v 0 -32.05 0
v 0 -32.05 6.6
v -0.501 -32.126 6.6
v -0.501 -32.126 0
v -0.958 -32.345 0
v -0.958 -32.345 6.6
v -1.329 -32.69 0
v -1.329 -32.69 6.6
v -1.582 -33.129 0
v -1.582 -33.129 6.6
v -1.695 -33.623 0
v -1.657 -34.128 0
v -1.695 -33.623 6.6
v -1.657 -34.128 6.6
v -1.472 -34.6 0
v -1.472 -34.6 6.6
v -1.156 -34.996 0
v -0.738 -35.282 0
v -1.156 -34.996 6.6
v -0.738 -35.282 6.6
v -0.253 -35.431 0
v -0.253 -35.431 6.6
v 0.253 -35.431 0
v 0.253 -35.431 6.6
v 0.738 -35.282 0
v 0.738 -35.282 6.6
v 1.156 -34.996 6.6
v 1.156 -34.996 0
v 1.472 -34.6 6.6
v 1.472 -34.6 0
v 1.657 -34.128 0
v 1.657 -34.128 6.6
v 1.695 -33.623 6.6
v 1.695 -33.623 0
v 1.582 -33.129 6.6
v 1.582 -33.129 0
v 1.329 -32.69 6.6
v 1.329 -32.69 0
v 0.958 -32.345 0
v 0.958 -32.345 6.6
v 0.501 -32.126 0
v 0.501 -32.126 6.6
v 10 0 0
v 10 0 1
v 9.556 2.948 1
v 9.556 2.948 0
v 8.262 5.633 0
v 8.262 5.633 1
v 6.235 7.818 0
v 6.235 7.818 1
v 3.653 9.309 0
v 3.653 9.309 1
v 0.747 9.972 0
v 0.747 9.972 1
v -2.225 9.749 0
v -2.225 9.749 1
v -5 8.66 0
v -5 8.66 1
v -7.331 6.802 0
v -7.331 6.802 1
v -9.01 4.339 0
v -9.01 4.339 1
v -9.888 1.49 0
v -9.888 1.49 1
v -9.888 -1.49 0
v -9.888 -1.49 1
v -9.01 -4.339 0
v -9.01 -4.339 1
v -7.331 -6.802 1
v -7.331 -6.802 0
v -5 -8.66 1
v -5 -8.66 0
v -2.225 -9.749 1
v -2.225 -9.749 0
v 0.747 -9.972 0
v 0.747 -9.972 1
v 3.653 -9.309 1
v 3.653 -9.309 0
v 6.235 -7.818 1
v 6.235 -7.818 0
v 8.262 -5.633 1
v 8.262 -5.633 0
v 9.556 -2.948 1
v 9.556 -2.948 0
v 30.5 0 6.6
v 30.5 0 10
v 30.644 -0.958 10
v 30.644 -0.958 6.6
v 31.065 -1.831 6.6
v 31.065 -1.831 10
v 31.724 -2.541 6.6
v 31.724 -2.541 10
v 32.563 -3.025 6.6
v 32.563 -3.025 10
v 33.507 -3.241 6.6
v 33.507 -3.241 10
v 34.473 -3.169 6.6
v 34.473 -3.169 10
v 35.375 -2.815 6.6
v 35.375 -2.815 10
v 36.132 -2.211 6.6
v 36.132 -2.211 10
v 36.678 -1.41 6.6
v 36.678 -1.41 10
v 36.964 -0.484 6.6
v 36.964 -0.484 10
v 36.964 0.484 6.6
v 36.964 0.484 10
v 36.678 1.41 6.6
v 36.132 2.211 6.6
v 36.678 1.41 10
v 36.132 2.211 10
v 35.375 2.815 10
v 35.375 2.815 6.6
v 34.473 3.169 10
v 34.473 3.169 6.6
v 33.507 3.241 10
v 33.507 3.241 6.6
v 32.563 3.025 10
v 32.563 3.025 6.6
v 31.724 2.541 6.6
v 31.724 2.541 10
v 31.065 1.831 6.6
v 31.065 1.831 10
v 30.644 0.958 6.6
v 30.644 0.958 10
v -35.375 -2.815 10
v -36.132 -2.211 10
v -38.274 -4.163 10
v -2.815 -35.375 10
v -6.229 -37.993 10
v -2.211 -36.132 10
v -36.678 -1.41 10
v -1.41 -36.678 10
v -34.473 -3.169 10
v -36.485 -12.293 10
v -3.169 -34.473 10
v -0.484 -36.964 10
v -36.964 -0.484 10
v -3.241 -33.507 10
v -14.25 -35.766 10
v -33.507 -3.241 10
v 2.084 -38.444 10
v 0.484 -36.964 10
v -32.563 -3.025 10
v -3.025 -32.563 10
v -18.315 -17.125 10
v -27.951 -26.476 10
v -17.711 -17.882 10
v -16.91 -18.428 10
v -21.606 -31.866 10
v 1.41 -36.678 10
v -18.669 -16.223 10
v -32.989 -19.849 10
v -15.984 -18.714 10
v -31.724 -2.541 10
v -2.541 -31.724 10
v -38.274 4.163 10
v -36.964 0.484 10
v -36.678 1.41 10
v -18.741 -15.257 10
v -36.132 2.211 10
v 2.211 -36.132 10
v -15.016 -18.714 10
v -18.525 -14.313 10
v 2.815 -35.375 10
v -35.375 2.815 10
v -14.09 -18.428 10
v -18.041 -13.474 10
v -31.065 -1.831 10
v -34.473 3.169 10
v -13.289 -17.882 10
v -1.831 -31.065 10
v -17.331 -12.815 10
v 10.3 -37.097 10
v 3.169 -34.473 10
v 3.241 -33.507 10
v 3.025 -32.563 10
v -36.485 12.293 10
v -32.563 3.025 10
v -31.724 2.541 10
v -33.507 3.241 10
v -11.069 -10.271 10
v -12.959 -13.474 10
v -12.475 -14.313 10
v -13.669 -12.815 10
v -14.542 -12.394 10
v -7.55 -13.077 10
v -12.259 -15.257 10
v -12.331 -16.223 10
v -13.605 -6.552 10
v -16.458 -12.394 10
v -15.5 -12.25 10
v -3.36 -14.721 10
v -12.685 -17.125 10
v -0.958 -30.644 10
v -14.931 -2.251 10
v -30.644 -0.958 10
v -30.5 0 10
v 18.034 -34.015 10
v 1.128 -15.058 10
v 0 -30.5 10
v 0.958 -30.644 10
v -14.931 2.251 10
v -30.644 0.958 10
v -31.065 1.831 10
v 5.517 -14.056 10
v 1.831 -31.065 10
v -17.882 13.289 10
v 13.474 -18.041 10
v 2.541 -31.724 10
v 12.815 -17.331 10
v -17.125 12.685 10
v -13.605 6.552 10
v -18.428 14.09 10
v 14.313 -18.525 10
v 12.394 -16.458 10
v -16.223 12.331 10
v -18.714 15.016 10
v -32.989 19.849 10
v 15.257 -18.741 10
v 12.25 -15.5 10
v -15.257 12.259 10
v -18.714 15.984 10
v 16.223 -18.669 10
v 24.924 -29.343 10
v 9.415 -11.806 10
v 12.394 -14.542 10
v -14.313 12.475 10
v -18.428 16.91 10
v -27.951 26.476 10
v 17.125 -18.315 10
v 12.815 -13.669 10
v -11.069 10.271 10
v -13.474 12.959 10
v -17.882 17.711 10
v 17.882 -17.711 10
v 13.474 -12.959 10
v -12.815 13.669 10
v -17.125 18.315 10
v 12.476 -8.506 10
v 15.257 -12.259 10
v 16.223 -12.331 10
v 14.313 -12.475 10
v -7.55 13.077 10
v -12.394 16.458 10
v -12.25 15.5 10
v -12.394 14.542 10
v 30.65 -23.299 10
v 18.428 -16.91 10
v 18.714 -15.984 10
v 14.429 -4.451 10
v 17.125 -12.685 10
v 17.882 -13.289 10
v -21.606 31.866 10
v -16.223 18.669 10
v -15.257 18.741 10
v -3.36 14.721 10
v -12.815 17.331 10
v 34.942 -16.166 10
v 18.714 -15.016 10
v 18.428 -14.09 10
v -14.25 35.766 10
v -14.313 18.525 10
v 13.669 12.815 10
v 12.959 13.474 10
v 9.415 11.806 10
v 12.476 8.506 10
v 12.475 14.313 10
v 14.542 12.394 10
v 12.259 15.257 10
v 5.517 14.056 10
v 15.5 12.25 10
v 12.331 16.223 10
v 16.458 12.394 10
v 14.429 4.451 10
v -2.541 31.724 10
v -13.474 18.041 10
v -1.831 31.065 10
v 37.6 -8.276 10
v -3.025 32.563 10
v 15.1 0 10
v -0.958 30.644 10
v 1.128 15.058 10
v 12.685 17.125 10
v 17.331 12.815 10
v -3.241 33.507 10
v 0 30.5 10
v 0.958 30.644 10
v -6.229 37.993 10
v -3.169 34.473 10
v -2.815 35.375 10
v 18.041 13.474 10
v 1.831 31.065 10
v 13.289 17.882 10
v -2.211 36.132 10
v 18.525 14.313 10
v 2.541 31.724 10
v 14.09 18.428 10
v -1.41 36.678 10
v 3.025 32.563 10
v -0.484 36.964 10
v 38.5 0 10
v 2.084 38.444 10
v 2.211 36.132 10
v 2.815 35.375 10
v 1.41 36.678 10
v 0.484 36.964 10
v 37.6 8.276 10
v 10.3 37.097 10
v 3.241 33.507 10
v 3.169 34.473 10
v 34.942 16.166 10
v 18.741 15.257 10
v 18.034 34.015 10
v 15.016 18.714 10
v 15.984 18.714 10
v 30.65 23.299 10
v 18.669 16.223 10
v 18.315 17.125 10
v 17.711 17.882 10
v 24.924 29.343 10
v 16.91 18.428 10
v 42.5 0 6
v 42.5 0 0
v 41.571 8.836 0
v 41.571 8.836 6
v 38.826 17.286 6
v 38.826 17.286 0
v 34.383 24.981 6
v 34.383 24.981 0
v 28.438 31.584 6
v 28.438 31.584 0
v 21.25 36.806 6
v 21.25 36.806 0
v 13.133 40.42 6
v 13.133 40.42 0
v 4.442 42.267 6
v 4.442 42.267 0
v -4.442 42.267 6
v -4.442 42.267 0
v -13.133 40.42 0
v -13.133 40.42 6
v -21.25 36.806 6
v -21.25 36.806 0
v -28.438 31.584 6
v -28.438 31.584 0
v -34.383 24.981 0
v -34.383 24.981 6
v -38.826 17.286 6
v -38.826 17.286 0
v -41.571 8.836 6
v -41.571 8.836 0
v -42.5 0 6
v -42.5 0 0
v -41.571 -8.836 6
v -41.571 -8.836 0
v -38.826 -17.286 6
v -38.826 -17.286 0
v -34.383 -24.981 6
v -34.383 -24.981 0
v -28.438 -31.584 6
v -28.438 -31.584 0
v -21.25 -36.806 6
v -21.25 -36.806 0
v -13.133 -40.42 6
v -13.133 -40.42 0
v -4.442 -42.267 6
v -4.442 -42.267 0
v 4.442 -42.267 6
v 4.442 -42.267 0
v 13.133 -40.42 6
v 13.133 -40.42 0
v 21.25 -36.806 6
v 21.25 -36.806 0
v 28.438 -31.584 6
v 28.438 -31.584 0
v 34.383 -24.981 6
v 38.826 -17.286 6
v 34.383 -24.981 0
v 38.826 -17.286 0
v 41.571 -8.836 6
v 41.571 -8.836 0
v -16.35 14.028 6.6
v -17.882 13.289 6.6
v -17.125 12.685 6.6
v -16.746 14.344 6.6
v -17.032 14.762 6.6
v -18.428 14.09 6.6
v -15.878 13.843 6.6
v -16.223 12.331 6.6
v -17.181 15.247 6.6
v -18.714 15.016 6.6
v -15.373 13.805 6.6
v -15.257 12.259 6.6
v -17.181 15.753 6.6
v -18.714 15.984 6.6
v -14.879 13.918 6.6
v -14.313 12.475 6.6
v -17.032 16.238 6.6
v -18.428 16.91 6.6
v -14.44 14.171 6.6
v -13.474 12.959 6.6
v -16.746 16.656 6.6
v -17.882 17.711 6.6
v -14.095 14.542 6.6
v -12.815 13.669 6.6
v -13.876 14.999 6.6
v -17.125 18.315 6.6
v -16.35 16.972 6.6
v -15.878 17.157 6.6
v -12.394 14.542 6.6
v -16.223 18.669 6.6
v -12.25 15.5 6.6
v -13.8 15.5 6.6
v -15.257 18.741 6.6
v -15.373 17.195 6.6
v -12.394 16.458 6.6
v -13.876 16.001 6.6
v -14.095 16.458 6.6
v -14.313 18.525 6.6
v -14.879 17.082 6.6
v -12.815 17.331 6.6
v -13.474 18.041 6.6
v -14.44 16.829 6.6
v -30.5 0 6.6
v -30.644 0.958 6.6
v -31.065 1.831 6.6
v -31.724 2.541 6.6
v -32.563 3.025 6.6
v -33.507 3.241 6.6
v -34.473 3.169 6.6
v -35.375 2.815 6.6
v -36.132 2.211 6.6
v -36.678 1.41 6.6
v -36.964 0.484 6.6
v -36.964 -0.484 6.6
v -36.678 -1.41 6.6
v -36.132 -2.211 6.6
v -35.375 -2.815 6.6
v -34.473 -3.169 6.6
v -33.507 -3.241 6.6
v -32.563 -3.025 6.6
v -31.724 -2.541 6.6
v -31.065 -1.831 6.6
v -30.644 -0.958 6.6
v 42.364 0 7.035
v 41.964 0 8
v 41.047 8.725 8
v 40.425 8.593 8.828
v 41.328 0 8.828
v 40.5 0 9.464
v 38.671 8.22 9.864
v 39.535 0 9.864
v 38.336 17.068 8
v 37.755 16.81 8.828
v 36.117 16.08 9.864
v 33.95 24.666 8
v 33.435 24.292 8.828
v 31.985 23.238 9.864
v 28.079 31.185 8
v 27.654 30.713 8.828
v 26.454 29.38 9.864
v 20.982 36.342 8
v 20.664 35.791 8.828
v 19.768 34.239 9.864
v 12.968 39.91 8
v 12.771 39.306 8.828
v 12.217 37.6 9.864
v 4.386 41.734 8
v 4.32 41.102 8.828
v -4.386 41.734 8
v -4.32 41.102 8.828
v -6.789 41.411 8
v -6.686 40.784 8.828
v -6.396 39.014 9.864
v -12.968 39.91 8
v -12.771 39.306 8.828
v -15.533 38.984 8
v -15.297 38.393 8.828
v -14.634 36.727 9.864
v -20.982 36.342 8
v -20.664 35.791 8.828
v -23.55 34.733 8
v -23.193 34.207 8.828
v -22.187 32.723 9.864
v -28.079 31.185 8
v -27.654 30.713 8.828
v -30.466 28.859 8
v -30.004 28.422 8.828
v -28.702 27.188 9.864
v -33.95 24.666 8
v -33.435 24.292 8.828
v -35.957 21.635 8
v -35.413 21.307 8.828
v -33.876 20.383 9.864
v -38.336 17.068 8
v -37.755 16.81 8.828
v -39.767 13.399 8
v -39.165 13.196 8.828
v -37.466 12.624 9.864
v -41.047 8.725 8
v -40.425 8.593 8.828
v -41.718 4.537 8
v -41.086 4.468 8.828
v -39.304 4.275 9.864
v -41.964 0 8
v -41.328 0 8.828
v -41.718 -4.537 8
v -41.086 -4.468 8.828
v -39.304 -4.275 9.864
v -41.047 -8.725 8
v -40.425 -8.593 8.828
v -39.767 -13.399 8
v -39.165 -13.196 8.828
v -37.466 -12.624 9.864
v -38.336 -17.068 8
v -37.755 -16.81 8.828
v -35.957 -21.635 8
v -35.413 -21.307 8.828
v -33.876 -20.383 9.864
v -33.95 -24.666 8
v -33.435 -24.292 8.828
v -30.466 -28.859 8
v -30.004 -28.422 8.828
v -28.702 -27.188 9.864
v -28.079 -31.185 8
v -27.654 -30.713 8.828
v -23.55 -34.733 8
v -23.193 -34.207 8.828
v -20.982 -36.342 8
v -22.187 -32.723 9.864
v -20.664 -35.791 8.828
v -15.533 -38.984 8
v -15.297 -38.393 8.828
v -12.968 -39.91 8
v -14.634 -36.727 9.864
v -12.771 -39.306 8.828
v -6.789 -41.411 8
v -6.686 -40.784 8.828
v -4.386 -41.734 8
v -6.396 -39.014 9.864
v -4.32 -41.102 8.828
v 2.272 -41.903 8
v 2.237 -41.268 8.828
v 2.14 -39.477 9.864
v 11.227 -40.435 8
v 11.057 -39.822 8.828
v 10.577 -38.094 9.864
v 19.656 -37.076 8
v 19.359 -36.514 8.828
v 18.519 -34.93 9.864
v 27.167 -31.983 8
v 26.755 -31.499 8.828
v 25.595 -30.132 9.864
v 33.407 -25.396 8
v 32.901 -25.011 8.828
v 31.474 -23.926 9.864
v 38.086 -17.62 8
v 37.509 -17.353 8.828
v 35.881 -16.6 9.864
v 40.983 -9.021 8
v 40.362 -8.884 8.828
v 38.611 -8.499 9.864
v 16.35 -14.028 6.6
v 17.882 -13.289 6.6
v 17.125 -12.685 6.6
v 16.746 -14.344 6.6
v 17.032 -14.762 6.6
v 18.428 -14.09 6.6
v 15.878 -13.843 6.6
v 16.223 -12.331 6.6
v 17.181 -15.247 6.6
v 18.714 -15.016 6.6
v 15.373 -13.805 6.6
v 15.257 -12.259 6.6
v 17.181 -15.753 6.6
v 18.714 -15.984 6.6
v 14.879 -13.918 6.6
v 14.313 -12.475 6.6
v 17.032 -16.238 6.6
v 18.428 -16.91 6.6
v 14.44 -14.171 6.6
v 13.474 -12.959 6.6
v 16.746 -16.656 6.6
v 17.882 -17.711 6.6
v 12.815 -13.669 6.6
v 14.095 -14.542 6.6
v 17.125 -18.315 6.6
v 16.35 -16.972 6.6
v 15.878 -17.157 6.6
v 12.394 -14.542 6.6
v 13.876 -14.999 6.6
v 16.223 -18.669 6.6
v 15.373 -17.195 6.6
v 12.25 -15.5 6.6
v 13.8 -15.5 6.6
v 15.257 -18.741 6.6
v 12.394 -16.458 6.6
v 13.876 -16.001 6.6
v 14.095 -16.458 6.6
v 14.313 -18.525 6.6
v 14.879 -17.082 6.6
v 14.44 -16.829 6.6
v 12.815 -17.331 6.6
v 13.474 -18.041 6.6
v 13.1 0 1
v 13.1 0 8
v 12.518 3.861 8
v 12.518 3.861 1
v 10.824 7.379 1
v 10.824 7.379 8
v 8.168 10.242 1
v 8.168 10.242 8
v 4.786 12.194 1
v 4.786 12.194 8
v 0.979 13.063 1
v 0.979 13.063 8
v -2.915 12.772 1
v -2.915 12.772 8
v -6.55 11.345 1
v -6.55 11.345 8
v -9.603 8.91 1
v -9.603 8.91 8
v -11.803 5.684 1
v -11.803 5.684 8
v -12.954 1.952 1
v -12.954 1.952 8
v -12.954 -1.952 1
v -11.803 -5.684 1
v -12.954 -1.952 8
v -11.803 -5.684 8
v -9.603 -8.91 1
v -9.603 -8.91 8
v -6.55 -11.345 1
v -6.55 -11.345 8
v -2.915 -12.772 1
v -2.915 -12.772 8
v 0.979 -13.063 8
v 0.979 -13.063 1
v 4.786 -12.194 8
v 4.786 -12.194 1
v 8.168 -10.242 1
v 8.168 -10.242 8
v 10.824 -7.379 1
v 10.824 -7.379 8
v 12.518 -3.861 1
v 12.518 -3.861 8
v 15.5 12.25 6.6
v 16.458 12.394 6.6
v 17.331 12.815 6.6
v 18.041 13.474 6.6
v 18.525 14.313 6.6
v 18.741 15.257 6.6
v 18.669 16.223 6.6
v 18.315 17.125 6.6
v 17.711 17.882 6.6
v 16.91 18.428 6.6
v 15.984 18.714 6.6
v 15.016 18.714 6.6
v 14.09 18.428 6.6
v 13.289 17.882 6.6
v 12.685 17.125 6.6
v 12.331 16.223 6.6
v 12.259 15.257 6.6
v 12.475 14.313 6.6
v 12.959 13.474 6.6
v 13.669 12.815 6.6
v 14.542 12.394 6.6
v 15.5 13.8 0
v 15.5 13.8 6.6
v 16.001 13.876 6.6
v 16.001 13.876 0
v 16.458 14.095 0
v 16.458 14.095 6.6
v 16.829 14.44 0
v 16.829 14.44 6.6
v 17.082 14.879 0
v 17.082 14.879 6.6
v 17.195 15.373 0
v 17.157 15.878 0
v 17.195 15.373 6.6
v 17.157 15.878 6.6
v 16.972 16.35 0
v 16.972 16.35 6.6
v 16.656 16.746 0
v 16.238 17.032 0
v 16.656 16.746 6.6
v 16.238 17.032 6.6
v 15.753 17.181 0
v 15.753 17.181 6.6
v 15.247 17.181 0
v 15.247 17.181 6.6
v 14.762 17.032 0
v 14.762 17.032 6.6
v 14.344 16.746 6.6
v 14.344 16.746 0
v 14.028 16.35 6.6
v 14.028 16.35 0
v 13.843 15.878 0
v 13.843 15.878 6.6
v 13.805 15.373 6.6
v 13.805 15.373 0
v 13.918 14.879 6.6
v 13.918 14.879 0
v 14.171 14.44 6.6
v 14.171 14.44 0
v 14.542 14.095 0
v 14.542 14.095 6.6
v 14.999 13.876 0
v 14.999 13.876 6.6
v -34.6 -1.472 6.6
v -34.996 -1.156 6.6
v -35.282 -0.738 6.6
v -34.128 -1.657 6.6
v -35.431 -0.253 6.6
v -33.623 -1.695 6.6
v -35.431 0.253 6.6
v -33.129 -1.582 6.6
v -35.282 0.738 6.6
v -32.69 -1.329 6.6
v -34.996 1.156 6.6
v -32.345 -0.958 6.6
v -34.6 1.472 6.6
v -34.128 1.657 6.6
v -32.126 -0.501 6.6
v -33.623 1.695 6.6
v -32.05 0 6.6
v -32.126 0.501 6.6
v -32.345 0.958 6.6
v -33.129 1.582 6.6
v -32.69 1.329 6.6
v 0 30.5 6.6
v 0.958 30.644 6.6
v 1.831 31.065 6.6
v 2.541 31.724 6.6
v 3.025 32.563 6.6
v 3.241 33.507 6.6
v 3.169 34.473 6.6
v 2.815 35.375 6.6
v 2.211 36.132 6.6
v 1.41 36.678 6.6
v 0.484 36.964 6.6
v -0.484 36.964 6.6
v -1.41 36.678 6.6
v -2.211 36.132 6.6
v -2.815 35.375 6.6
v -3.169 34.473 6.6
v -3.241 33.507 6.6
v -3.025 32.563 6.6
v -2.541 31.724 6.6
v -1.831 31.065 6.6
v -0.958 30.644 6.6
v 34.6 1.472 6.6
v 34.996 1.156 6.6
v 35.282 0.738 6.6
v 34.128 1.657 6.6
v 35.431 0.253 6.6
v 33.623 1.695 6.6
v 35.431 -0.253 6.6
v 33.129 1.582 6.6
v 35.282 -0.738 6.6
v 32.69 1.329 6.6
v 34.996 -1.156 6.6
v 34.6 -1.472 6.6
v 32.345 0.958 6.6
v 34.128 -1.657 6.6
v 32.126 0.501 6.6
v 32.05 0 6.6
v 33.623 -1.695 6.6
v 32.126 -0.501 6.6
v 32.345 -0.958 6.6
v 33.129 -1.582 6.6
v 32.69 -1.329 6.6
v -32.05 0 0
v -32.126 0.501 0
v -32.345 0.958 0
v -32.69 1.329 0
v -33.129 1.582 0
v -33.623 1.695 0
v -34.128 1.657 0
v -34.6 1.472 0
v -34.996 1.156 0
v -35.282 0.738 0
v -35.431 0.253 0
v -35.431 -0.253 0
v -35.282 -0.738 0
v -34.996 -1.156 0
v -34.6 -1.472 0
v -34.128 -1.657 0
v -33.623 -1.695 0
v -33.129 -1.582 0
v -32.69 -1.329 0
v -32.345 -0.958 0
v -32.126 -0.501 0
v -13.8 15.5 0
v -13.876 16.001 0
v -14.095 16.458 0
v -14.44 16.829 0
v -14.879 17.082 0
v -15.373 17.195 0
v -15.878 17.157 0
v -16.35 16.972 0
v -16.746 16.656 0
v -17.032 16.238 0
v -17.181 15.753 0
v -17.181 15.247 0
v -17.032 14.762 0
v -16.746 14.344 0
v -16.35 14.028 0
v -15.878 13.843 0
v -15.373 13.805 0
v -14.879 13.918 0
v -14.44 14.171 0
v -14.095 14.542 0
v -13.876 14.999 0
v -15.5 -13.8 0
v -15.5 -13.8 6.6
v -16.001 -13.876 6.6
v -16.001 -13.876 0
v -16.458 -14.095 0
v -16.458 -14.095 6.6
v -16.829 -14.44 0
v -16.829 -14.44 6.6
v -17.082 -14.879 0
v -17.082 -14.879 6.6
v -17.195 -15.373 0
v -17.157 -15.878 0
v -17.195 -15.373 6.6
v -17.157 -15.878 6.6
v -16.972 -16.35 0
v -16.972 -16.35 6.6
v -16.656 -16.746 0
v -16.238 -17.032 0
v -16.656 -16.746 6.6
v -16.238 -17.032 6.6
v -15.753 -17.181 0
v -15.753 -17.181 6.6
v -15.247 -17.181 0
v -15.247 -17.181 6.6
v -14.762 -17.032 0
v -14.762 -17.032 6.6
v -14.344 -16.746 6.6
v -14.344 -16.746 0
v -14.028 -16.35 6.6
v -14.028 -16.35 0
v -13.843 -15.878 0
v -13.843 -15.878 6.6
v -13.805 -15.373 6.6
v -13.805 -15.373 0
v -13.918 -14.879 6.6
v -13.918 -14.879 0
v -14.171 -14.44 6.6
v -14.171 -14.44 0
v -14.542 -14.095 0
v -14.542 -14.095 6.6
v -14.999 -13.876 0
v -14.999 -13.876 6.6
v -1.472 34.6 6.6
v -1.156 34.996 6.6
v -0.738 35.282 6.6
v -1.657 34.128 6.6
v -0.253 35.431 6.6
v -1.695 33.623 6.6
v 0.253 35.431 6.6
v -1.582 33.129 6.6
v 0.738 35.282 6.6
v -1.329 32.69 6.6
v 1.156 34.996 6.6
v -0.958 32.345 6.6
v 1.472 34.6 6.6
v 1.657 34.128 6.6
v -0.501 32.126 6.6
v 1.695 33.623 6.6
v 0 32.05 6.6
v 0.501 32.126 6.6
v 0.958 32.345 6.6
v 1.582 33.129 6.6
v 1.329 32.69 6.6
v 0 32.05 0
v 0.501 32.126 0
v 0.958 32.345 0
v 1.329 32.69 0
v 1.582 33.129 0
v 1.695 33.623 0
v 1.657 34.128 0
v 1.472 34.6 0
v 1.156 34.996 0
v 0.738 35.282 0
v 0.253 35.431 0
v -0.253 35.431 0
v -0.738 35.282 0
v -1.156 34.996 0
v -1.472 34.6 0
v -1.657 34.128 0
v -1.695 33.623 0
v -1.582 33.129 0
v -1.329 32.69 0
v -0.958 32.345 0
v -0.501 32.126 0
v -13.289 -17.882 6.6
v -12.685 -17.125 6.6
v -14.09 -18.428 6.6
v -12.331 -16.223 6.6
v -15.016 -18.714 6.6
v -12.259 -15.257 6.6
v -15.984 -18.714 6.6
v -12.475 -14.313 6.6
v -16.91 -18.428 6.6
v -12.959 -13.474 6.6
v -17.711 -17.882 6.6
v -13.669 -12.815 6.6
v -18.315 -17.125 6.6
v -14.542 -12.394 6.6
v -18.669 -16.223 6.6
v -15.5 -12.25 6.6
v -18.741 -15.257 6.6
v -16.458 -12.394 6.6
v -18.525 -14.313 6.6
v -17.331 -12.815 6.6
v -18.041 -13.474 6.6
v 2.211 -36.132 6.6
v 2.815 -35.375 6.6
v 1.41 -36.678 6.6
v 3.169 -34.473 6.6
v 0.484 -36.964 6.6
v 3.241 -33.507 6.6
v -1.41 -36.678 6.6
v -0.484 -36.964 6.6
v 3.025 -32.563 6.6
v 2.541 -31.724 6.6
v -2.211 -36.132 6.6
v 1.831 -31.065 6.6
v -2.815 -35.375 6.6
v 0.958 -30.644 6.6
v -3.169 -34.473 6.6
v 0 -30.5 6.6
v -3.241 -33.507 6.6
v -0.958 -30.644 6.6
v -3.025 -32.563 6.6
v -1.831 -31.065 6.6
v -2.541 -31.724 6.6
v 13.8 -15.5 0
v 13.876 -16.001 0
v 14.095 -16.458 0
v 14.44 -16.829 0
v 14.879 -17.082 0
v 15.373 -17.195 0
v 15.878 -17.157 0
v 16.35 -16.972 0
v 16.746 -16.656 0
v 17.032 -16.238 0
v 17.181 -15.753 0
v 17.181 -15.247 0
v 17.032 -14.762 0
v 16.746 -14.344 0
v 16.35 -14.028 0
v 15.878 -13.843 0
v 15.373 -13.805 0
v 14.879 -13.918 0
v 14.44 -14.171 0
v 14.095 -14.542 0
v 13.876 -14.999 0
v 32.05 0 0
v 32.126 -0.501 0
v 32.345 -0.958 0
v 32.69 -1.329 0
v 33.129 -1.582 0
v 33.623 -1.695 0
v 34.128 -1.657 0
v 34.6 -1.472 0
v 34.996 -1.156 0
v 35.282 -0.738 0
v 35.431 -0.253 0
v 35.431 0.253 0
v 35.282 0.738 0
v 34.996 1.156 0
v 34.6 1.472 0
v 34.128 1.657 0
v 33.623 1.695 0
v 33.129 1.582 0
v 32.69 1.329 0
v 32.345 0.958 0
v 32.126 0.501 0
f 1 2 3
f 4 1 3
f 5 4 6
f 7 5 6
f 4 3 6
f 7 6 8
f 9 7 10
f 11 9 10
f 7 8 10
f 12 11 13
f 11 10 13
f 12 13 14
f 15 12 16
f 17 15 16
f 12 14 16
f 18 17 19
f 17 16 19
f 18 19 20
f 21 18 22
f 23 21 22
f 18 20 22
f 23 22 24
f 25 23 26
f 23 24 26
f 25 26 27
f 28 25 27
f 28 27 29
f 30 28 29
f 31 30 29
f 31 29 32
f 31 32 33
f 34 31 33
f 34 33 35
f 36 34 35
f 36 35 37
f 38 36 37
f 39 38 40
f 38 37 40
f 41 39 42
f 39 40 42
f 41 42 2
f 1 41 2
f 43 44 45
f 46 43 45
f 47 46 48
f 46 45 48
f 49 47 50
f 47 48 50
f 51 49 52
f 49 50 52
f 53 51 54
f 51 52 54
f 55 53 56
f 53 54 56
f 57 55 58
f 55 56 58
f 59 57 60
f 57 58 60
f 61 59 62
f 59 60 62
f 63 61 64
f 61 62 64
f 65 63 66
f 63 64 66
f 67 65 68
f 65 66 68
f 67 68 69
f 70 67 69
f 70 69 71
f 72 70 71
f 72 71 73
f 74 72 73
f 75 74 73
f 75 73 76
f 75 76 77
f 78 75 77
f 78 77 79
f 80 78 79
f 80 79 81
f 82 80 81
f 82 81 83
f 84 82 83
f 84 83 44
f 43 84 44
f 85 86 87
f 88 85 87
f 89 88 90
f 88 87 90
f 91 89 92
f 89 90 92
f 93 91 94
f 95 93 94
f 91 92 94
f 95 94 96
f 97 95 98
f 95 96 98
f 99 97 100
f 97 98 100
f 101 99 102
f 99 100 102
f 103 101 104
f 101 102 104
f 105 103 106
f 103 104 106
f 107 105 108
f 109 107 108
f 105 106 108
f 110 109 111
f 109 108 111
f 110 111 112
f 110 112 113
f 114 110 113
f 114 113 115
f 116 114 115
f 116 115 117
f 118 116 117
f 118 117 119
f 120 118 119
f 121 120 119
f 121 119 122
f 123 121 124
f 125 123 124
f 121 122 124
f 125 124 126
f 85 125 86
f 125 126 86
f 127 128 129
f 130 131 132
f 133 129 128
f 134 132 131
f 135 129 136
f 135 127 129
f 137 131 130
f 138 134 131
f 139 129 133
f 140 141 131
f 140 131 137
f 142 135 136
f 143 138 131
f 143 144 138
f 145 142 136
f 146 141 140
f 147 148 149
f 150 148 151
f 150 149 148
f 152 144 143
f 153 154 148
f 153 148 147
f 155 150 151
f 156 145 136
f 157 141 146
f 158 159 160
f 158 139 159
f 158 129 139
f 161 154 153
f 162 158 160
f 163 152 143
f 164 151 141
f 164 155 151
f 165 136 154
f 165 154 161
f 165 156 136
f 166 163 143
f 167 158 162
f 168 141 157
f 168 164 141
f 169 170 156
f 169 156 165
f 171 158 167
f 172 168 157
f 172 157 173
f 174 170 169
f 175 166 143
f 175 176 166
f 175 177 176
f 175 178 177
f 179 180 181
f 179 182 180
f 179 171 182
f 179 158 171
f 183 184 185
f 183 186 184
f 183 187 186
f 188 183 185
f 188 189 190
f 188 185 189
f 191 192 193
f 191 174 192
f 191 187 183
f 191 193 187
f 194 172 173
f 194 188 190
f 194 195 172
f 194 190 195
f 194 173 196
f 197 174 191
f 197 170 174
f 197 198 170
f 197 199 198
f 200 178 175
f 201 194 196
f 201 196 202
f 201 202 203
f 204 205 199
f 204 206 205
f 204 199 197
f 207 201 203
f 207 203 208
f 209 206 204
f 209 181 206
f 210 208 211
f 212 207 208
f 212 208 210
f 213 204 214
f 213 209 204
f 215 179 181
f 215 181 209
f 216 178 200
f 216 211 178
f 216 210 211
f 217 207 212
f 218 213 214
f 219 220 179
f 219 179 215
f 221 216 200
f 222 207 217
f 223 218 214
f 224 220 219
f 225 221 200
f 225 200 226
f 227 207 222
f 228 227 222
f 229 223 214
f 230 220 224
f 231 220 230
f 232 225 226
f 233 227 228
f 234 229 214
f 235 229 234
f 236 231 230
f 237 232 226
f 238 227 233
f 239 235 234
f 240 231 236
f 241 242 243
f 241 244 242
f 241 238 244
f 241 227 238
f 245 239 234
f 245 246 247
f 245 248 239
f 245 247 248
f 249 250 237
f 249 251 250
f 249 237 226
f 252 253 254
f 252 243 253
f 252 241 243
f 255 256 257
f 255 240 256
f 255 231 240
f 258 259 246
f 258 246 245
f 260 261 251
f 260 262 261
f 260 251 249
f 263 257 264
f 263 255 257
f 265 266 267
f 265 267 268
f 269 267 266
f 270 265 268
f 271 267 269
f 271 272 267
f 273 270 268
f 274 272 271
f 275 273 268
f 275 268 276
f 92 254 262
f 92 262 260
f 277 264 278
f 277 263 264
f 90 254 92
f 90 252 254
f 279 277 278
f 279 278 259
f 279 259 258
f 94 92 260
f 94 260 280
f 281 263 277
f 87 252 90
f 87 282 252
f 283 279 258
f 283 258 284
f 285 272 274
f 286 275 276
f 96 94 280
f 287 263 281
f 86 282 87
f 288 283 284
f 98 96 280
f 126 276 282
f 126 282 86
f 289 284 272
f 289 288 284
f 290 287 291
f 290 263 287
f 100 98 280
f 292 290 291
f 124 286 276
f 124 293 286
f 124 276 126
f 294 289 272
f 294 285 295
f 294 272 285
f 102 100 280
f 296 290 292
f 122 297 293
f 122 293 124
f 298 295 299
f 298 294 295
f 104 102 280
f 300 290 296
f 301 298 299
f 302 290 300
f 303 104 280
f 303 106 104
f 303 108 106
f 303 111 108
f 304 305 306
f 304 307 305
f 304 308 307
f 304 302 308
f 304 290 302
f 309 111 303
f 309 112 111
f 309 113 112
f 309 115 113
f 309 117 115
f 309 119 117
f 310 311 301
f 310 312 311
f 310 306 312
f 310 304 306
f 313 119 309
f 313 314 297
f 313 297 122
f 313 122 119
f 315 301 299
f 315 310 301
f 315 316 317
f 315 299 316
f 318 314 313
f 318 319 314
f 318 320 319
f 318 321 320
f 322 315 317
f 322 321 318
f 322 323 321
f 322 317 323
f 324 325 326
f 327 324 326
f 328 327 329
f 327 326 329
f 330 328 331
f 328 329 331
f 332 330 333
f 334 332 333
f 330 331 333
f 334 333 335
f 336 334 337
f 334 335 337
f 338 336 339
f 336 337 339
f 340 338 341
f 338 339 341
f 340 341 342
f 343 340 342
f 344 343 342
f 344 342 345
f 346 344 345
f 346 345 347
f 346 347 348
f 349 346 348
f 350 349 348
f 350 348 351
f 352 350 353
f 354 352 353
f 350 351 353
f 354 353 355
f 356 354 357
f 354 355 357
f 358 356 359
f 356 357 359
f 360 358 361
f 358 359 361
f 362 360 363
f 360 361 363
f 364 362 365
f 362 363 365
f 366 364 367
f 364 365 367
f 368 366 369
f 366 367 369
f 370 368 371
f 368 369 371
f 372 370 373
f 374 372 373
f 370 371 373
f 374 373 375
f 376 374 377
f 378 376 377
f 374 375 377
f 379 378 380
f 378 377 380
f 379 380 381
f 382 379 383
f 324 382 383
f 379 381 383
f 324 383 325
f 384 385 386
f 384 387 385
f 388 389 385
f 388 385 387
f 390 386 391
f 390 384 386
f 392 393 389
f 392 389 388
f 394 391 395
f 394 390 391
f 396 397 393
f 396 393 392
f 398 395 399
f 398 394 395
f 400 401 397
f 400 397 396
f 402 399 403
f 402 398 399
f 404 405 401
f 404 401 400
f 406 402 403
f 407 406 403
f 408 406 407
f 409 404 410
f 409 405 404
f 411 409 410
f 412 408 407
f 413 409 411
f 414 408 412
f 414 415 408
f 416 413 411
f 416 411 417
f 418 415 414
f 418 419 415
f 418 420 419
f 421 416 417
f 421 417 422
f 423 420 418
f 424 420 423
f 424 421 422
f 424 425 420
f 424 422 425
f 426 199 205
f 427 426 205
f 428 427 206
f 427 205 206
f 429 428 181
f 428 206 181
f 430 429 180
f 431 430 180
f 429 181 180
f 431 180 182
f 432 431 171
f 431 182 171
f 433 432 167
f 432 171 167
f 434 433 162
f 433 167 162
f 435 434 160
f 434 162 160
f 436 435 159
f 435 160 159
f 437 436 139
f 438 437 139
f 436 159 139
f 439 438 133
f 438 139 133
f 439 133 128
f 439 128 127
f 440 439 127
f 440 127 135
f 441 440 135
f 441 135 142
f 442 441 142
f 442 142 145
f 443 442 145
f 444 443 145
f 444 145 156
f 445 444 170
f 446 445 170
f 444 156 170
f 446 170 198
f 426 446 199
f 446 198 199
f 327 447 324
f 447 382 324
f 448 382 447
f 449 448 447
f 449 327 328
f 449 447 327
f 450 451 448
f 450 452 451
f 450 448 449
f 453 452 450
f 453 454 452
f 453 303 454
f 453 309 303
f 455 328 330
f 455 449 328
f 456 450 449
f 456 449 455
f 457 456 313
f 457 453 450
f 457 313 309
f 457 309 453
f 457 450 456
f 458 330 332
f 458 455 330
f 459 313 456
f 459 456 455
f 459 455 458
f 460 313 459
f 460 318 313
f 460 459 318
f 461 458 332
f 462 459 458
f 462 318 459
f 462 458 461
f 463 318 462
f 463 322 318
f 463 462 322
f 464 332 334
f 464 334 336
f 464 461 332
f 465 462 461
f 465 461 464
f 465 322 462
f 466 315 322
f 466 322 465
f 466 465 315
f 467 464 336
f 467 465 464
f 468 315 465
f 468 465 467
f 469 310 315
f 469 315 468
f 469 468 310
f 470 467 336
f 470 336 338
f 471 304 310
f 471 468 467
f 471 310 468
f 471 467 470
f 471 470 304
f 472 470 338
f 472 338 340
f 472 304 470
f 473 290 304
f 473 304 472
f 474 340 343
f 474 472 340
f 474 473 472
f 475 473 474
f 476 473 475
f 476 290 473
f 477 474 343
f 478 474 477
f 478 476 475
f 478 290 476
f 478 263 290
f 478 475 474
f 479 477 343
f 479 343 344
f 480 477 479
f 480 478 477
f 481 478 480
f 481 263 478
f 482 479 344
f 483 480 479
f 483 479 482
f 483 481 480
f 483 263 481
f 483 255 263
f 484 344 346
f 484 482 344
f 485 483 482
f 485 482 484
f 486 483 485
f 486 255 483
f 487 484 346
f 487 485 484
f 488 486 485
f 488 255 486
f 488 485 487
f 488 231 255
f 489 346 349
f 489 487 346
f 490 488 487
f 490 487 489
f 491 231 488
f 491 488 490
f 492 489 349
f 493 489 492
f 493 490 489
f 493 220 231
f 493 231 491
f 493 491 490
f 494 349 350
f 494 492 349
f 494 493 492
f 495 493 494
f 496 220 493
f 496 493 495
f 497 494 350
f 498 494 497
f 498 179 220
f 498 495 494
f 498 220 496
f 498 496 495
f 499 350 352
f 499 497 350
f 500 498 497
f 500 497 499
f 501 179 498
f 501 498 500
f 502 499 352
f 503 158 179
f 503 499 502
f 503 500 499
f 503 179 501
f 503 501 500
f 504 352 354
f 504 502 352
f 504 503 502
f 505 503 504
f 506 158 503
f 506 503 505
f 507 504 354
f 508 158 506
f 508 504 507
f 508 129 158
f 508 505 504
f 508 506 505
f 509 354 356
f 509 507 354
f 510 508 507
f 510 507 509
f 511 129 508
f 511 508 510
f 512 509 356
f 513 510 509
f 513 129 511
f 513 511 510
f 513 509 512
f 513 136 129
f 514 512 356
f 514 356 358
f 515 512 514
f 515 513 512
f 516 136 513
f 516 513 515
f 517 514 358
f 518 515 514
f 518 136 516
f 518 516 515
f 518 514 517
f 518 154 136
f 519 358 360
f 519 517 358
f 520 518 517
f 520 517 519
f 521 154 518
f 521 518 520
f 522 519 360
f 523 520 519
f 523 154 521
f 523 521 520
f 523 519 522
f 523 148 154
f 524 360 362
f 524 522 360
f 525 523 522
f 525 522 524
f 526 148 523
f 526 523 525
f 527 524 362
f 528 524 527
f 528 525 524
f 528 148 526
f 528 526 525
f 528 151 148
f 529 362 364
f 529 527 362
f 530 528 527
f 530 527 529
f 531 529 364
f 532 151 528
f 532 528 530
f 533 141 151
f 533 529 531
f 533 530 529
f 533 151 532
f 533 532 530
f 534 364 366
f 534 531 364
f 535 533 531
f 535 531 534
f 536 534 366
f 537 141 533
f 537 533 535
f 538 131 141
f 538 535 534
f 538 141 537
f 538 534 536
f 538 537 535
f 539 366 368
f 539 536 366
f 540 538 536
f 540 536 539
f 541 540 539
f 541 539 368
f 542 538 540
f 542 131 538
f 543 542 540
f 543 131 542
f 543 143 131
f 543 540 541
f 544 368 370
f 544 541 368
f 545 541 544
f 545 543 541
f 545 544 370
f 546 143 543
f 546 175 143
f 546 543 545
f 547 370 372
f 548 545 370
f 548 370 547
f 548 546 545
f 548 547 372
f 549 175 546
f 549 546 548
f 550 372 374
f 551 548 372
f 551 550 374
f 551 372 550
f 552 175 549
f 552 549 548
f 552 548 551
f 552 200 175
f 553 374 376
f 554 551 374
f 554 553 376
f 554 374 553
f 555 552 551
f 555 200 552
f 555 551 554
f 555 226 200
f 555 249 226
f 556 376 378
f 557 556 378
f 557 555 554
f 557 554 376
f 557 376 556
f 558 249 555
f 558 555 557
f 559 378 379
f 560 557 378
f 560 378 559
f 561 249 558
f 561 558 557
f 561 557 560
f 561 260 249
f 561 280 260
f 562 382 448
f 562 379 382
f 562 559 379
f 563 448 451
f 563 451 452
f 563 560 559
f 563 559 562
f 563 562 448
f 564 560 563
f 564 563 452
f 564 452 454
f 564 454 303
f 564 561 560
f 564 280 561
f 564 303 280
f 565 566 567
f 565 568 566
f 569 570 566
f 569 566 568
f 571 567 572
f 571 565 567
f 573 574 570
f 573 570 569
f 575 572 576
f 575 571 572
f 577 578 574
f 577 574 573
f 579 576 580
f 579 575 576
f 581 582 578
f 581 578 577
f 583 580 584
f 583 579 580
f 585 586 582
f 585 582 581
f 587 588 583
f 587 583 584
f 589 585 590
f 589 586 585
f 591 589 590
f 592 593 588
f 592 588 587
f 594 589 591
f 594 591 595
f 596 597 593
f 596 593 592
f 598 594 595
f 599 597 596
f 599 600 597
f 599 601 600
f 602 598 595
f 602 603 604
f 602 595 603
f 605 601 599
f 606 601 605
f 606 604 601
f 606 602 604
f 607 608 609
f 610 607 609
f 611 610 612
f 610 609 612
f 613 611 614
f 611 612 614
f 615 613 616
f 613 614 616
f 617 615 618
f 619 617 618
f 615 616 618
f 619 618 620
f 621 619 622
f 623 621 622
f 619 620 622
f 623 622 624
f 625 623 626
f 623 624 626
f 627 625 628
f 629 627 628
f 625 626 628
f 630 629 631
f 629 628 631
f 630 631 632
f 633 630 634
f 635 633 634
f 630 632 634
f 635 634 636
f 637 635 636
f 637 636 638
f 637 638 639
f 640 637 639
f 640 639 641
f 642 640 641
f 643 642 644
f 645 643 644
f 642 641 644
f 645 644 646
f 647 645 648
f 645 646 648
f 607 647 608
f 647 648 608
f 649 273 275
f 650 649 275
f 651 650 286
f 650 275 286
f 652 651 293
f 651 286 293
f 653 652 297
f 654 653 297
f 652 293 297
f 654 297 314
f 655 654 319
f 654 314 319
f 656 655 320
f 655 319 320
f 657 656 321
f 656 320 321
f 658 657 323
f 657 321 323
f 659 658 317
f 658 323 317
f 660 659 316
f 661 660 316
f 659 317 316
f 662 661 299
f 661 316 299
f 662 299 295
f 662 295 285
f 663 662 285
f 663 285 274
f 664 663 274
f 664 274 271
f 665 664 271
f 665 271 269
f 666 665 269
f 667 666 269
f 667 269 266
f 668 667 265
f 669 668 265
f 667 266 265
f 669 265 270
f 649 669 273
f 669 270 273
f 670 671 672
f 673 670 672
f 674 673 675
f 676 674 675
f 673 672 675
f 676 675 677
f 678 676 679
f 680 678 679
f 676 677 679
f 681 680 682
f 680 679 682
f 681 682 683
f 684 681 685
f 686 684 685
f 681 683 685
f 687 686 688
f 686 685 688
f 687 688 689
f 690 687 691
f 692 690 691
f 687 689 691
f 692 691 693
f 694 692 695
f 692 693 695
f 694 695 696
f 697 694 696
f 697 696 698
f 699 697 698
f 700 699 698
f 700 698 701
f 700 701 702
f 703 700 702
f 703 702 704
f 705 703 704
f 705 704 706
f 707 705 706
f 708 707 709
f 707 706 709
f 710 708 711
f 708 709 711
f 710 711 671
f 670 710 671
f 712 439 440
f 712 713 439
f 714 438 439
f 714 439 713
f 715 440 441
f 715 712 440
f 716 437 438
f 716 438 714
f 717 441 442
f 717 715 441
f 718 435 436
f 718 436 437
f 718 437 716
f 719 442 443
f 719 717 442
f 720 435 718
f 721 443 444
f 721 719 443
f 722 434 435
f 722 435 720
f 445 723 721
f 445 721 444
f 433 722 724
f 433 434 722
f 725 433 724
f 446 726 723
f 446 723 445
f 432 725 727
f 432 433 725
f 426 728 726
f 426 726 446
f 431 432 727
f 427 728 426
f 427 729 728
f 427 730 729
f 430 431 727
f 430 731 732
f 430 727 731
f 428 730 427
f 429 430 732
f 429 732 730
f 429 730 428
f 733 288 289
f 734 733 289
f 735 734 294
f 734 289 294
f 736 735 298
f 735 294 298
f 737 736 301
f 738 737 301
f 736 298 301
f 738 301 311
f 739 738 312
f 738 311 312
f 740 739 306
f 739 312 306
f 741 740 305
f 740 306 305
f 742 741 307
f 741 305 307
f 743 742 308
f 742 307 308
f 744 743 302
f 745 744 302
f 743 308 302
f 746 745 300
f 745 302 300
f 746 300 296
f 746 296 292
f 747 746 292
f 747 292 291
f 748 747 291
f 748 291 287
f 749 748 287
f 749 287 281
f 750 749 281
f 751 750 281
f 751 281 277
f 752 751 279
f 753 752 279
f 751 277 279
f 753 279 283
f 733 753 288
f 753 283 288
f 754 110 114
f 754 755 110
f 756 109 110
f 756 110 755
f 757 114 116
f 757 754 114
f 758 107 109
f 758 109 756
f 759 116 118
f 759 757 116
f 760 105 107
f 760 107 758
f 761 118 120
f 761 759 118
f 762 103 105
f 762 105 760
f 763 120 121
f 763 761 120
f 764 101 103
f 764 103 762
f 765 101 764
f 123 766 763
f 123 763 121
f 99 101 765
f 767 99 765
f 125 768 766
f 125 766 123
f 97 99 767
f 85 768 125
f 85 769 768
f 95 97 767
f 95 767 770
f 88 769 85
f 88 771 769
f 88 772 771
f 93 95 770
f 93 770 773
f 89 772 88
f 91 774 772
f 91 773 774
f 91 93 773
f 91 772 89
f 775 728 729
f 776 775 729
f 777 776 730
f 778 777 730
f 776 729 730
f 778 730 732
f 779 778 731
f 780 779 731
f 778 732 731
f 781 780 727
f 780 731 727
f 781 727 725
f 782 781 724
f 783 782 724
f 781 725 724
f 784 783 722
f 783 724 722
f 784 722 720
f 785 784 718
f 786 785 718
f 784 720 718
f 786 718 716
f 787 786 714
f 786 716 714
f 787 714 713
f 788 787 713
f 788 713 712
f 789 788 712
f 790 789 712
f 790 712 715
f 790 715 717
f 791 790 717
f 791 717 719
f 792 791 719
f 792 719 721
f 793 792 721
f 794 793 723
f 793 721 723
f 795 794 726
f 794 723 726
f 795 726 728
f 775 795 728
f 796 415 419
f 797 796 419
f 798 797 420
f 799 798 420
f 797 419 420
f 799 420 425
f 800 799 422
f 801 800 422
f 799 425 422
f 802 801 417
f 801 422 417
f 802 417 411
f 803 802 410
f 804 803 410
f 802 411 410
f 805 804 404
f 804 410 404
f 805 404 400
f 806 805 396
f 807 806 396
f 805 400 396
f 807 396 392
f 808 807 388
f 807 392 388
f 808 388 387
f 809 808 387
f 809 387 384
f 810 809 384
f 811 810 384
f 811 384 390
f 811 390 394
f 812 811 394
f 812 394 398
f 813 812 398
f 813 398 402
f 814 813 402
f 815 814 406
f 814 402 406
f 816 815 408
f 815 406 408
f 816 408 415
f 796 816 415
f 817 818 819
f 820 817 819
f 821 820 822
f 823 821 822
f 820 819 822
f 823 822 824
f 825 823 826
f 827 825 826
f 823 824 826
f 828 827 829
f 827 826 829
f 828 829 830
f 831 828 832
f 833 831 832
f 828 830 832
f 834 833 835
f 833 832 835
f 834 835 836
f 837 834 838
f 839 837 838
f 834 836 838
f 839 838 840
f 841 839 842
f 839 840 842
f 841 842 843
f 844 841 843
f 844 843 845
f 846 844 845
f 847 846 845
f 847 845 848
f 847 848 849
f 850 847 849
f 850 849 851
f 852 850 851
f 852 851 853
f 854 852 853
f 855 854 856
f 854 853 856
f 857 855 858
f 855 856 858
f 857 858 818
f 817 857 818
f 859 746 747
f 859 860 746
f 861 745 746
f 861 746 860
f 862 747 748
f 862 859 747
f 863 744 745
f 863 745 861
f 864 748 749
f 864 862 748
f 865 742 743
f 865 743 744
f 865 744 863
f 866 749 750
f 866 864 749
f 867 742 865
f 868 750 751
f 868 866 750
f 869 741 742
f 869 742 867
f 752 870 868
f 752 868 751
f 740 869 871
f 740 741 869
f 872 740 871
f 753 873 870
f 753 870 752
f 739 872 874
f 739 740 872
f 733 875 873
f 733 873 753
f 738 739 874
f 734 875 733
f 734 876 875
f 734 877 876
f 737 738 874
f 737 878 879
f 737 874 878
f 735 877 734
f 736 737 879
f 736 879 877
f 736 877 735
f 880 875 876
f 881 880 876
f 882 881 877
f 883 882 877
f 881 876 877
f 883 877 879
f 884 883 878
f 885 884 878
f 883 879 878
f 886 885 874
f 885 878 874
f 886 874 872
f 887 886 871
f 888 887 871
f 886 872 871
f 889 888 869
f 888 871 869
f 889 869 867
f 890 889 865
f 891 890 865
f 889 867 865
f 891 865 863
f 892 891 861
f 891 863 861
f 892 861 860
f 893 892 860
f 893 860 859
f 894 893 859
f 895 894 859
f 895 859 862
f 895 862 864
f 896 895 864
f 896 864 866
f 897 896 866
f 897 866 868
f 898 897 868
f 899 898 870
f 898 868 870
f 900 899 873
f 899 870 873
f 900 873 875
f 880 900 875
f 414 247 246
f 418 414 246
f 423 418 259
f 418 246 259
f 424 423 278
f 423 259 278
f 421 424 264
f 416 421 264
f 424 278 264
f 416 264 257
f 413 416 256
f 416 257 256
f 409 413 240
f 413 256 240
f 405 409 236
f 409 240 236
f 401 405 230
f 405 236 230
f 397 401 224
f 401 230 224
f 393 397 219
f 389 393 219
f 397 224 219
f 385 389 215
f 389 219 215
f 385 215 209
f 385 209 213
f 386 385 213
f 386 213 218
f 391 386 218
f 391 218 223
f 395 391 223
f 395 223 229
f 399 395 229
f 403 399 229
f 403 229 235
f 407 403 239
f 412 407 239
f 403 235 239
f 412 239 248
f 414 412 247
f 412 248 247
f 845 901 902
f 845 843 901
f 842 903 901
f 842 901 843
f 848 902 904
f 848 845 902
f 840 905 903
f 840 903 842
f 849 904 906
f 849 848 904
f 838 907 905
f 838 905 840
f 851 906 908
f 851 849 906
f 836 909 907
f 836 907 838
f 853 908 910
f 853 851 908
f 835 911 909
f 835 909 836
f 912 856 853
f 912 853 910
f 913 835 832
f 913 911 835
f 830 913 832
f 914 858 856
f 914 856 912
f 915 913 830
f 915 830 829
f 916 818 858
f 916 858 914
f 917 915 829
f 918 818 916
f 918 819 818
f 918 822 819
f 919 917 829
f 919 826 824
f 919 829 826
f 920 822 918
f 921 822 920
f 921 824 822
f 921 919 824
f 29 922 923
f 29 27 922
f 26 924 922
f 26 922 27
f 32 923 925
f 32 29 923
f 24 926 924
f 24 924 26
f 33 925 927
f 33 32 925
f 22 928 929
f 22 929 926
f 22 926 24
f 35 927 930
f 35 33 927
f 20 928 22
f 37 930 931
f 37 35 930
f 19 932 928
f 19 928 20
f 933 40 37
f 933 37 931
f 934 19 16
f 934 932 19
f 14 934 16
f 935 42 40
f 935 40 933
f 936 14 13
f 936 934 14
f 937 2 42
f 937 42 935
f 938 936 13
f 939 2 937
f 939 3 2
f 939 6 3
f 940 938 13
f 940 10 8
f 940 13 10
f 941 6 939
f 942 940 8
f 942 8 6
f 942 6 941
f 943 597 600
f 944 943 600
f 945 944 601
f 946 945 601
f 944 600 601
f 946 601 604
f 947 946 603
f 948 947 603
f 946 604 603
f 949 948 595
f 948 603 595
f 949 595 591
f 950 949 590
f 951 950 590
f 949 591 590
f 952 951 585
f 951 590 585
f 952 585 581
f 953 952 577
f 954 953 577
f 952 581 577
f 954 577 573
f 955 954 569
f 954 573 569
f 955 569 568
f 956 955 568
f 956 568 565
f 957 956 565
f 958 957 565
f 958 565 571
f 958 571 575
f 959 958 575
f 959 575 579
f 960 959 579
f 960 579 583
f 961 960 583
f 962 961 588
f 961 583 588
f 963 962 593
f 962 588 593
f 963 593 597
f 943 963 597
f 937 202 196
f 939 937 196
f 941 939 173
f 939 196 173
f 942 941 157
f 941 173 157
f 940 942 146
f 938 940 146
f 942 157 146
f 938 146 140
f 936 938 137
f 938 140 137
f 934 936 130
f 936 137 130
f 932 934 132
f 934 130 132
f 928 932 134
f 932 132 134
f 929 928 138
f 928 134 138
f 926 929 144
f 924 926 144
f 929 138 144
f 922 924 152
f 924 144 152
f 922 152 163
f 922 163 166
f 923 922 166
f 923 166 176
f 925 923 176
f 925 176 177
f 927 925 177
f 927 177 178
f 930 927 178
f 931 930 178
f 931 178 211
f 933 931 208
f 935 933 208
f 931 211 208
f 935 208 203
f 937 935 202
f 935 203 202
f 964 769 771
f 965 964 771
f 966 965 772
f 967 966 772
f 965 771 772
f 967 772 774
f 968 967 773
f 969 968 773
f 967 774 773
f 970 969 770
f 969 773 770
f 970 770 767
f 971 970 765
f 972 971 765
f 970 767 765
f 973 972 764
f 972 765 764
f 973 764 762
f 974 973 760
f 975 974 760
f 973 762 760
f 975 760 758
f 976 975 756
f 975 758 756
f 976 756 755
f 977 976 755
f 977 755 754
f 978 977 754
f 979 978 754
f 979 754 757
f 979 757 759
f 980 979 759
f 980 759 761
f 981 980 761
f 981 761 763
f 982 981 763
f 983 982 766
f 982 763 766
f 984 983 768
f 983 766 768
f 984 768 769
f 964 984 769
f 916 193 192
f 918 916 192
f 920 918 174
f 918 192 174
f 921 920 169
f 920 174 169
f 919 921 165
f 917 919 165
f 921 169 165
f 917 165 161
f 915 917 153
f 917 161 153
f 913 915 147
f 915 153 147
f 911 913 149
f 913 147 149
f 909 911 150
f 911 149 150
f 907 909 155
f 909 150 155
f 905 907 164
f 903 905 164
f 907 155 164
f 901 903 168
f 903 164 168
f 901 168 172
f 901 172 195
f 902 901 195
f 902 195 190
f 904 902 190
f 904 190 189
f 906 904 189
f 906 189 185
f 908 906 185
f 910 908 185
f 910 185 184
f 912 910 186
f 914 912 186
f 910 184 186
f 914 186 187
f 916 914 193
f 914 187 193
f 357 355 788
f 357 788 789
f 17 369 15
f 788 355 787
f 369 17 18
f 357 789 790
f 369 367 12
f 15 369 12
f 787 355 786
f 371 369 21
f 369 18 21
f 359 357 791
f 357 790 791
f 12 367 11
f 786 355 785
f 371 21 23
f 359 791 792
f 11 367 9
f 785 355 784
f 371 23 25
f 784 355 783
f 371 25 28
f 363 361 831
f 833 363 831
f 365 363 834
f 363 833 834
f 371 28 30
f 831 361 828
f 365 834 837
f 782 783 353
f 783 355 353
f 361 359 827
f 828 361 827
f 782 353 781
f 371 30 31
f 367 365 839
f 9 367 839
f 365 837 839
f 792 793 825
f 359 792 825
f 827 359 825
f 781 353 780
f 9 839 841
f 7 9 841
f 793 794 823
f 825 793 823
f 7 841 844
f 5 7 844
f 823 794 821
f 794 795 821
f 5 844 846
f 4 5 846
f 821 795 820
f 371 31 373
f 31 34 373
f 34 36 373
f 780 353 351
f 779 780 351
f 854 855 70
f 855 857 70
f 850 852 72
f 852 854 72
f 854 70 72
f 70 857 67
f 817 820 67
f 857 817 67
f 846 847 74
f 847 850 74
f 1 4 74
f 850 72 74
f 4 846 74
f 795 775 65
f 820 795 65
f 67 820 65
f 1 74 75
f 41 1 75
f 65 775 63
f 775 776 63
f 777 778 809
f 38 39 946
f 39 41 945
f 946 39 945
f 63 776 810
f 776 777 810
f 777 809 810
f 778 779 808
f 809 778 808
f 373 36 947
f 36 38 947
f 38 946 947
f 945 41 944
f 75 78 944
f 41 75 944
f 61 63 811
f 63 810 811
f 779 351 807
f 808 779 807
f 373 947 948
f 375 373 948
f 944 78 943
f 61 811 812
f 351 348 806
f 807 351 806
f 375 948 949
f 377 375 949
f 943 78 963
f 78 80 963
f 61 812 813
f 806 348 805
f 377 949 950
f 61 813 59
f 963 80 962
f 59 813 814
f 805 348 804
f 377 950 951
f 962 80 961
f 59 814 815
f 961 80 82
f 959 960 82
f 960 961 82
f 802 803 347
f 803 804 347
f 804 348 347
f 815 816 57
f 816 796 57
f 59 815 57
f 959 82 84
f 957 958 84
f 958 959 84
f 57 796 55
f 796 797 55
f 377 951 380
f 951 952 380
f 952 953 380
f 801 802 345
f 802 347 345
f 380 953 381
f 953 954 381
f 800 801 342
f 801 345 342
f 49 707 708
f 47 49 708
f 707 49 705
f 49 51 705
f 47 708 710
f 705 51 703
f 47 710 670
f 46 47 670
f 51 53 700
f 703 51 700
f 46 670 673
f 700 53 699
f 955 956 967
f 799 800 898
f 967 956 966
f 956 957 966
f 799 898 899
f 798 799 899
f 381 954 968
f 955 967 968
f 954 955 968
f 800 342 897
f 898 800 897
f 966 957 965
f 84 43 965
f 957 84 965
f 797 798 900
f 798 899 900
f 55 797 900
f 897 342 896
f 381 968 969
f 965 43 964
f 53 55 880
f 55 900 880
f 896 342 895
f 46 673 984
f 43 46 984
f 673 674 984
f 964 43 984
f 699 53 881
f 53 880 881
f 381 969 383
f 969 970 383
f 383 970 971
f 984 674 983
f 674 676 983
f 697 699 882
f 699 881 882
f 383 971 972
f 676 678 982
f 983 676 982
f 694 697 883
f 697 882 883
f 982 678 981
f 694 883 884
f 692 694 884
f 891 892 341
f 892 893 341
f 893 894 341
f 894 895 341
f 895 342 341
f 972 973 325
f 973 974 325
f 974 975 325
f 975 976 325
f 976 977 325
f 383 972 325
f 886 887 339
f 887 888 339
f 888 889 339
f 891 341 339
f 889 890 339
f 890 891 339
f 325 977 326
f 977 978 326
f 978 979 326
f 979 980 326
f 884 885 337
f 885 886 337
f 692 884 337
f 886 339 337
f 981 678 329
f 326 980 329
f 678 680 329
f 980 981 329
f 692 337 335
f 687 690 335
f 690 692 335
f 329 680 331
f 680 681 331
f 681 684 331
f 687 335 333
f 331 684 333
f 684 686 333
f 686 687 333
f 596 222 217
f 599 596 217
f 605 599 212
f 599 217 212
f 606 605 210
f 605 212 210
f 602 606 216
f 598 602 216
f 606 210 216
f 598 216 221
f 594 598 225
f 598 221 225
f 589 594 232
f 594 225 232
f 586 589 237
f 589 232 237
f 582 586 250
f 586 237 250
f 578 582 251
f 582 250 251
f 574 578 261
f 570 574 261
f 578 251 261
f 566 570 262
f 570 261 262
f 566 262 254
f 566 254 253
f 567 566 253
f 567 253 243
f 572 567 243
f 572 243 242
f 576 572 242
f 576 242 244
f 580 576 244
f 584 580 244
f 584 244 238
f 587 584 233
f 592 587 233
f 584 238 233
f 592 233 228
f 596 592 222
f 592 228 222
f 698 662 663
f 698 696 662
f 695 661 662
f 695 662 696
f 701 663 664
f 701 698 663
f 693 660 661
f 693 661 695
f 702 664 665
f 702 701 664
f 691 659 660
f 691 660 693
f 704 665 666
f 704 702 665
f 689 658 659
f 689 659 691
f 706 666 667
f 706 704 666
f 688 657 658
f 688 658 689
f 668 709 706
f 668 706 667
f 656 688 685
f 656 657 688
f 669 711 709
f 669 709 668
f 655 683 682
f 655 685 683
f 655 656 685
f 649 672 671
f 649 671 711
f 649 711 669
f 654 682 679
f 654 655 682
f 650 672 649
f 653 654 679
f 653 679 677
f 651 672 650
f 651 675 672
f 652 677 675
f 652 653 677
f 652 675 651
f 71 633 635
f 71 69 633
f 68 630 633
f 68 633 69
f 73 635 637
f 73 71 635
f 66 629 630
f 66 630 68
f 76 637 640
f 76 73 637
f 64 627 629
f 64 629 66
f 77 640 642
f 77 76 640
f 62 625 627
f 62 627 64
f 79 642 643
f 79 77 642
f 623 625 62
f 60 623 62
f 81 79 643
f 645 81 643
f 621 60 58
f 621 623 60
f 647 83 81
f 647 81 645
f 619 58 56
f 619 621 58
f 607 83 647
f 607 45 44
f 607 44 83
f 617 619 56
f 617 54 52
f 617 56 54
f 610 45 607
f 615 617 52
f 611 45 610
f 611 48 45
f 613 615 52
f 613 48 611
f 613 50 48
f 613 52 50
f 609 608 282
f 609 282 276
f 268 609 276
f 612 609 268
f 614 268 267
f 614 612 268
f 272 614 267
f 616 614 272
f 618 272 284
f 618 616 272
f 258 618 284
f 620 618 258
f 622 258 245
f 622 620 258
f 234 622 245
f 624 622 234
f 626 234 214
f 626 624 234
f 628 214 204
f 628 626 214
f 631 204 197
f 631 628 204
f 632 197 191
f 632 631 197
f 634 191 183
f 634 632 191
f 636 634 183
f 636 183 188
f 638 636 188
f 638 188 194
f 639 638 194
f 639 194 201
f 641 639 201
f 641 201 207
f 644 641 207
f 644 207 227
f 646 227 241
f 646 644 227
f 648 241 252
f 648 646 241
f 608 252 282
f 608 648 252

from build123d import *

# Parameters (mm, degrees)
SKIZZE3_R                       = 42.5
AUFSATZ_LINEAR_AUSTRAGEN1_DEPTH = 10
SKIZZE4_R                       = 10
SCHNITT_LINEAR_AUSTRAGEN1_DEPTH = 10
SKIZZE5_R                       = 3.25
SCHNITT_LINEAR_AUSTRAGEN3_DEPTH = 3.4
SKIZZE6_R                       = 1.7
SCHNITT_LINEAR_AUSTRAGEN4_DEPTH = 6.6
KREISMUSTER1_COUNT              = 4
SKIZZE7_R                       = 13.1
SCHNITT_LINEAR_AUSTRAGEN5_DEPTH = 9
VERRUNDUNG1_R                   = 4
FASE1_SIZE                      = 2


with BuildPart() as part:
    # Skizze3 → Aufsatz-Linear austragen1 (new body)
    with BuildSketch(Plane.XY):
        Circle(SKIZZE3_R)
    extrude(amount=AUFSATZ_LINEAR_AUSTRAGEN1_DEPTH)

    # Skizze4 → Schnitt-Linear austragen1 (cut)
    with BuildSketch(Plane.XY.offset(10)):
        Circle(SKIZZE4_R)
    extrude(amount=-SCHNITT_LINEAR_AUSTRAGEN1_DEPTH, mode=Mode.SUBTRACT)

    # Skizze5 → Schnitt-Linear austragen3 (cut)
    with BuildSketch(Plane.XY.offset(10)):
        with Locations((-15.5, 15.5)):
            Circle(SKIZZE5_R)
        with Locations((-33.75, 0)):
            Circle(SKIZZE5_R)
    schnitt_linear_austragen3 = extrude(amount=-SCHNITT_LINEAR_AUSTRAGEN3_DEPTH, mode=Mode.SUBTRACT)

    # Skizze6 → Schnitt-Linear austragen4 (cut)
    with BuildSketch(Plane.XY.offset(6.6)):
        with Locations((-15.5, 15.5)):
            Circle(SKIZZE6_R)
        with Locations((-33.75, 0)):
            Circle(SKIZZE6_R)
    schnitt_linear_austragen4 = extrude(amount=-SCHNITT_LINEAR_AUSTRAGEN4_DEPTH, mode=Mode.SUBTRACT)

    # Kreismuster1: Schnitt-Linear austragen3, Schnitt-Linear austragen4 ×4 about axis
    kreismuster1_axis = Axis((0, 0, 0), (0, 0, 1))
    add([schnitt_linear_austragen3.rotate(kreismuster1_axis, i * 360 / KREISMUSTER1_COUNT) for i in range(1, KREISMUSTER1_COUNT)], mode=Mode.SUBTRACT)
    add([schnitt_linear_austragen4.rotate(kreismuster1_axis, i * 360 / KREISMUSTER1_COUNT) for i in range(1, KREISMUSTER1_COUNT)], mode=Mode.SUBTRACT)

    # Skizze7 → Schnitt-Linear austragen5 (cut)
    with BuildSketch(Plane.XY.offset(10)):
        Circle(SKIZZE7_R)
    extrude(amount=-SCHNITT_LINEAR_AUSTRAGEN5_DEPTH, mode=Mode.SUBTRACT)

    # Verrundung1
    verrundung1_edges = [part.edges().sort_by_distance(p)[0] for p in [
        (-42.5, 0, 10),
    ]]
    fillet(verrundung1_edges, radius=VERRUNDUNG1_R)

    # Fase1
    fase1_edges = [part.edges().sort_by_distance(p)[0] for p in [
        (-13.1, 0, 10),
    ]]
    chamfer(fase1_edges, length=FASE1_SIZE)


solid = part.part
